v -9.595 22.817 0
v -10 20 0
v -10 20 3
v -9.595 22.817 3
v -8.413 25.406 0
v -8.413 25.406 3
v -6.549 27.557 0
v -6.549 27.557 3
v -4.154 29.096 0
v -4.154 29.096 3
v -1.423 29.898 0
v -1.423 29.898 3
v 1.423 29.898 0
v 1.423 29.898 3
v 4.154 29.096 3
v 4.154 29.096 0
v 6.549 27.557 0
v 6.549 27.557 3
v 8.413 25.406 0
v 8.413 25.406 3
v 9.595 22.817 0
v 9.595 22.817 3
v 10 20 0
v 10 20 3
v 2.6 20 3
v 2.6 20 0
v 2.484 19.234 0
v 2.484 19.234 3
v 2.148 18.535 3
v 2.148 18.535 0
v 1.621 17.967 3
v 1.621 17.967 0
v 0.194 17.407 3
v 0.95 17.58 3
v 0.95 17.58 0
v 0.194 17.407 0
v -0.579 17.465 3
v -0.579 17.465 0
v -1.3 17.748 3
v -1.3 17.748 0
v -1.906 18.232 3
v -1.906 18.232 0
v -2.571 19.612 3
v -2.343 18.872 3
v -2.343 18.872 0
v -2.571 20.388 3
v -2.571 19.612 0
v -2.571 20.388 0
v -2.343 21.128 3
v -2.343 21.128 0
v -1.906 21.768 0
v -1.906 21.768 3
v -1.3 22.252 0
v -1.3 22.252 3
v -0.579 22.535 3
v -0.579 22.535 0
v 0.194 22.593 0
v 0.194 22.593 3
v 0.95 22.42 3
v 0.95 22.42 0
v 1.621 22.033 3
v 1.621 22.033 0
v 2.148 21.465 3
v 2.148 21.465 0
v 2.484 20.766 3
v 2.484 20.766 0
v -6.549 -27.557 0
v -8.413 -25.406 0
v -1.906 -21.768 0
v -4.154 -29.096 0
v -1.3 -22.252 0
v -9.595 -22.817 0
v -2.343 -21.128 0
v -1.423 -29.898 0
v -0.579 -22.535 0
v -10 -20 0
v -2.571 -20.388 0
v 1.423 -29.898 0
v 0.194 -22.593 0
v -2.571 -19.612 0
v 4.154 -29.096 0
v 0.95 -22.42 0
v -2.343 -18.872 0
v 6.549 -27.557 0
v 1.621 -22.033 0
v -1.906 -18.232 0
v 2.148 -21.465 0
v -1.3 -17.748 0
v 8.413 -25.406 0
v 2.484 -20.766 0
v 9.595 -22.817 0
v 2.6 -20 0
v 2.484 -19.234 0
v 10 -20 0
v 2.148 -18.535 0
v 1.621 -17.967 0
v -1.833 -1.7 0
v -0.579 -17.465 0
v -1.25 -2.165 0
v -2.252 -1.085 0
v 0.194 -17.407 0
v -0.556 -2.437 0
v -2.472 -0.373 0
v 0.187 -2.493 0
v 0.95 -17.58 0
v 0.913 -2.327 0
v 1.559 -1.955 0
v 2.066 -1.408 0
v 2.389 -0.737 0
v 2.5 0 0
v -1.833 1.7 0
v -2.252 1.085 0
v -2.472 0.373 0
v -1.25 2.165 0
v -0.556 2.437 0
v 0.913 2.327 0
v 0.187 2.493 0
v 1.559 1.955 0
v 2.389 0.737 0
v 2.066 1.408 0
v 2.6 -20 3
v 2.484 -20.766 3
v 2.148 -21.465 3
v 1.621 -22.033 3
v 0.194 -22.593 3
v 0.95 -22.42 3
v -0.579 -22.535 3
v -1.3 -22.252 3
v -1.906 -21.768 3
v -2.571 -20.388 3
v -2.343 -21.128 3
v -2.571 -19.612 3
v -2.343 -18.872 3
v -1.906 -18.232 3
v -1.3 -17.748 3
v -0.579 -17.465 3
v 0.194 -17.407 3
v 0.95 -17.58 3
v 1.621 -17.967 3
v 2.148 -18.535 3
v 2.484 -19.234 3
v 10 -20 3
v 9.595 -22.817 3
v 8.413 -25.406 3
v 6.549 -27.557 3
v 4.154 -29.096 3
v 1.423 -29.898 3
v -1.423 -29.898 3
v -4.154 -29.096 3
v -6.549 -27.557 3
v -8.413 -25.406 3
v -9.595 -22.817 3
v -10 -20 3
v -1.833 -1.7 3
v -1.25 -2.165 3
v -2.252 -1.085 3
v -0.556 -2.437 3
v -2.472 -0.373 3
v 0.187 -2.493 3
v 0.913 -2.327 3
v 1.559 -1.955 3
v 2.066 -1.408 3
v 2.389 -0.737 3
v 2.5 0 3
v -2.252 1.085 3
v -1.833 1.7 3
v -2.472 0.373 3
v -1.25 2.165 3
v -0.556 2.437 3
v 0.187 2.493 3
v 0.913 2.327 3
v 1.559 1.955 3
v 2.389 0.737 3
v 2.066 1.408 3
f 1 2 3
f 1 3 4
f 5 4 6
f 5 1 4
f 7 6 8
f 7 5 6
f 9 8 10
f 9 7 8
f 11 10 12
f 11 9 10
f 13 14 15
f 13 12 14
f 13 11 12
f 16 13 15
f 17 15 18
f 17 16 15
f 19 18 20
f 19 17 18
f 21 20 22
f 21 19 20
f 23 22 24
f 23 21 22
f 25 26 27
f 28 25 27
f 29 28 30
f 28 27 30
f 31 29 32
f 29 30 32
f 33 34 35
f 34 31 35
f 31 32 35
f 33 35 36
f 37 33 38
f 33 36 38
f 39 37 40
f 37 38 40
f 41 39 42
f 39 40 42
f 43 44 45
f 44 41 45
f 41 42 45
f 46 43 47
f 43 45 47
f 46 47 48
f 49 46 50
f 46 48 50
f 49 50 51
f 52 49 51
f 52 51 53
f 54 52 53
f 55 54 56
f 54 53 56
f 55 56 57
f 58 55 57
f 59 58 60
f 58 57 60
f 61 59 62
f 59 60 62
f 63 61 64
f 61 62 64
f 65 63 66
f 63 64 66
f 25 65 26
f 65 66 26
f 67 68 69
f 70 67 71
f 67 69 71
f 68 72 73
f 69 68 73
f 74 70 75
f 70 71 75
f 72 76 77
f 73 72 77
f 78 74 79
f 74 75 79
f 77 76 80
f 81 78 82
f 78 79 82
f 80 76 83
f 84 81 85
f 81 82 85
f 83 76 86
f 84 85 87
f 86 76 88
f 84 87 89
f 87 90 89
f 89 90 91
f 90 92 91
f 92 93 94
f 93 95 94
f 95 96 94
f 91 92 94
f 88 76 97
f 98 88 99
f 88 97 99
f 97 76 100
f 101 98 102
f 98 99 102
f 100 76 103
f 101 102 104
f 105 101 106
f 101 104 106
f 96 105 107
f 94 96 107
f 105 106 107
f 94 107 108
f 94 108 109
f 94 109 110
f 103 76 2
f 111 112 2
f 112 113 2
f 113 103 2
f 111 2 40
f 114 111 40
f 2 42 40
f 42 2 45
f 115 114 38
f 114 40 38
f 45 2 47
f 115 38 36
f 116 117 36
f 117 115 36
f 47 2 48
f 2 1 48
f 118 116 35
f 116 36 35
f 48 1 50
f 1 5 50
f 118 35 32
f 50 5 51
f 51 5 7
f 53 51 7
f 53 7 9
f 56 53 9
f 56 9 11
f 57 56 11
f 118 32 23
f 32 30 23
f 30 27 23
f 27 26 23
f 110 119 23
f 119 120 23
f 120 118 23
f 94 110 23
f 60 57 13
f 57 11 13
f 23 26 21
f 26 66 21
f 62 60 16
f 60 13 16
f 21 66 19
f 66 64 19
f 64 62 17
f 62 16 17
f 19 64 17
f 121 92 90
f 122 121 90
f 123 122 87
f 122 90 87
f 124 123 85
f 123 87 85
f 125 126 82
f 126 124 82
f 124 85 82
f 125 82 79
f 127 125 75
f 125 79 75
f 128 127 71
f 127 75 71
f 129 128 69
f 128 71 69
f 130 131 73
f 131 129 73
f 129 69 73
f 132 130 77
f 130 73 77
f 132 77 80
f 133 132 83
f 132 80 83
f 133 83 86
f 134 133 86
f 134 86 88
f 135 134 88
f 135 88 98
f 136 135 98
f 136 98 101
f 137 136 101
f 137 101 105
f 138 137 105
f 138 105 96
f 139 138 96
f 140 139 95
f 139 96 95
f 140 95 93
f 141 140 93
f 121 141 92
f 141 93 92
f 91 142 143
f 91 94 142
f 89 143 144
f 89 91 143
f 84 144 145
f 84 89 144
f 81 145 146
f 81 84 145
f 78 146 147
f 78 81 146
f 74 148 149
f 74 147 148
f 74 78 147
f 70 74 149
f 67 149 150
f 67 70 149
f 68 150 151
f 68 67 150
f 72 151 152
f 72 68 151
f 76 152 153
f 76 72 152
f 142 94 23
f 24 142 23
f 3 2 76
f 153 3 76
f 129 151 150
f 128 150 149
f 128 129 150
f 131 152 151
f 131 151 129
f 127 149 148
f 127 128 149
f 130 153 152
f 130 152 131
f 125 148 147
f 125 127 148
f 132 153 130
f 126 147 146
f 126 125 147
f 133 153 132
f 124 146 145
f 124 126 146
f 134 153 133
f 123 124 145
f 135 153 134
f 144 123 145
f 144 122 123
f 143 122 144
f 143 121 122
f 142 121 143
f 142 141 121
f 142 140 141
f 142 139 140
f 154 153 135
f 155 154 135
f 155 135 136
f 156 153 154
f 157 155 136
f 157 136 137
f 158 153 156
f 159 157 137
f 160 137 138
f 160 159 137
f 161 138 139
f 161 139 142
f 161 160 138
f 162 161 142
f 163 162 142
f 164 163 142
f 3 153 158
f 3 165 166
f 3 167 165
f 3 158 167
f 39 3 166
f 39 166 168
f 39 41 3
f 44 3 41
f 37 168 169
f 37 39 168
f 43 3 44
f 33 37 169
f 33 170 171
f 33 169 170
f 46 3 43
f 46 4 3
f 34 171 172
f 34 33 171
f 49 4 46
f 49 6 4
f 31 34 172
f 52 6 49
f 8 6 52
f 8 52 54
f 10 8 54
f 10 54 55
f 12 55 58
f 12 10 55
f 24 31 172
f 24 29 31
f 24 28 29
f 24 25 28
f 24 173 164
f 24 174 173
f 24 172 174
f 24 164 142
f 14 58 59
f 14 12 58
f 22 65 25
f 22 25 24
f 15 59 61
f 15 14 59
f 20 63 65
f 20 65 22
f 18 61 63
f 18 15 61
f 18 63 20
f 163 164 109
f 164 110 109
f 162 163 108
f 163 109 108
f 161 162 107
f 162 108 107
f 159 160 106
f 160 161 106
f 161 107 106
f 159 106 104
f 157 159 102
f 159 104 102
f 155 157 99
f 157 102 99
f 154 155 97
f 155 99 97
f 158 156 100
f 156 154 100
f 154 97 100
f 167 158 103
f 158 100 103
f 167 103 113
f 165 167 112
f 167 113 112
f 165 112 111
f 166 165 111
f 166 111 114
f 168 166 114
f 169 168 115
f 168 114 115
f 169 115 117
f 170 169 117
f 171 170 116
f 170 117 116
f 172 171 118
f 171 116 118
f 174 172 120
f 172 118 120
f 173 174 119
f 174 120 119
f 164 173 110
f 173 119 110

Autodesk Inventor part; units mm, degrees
ref_plane "YZ Plane" through (0, 0, 0) normal (1, 0, 0) x (0, 1, 0)
ref_plane "XZ Plane" through (0, 0, 0) normal (0, 1, 0) x (-1, 0, 0)
ref_plane "XY Plane" through (0, 0, 0) normal (0, 0, 1) x (1, 0, 0)
sketch "Sketch1" plane through (0, 0, 0) normal (0, 0, 1) x (1, 0, 0)
  line L0 (0, 0) -> (0, 20) construction
  line L1 (0, 0) -> (0, 20) construction
  line L2 (0, 20) -> (0, -20) construction
  line L3 (-10, 20) -> (-10, -20)
  line L4 (10, -20) -> (10, 20)
  arc A0 (10, 20) -> (-10, 20) centre (0, 20) ccw
  arc A1 (-10, -20) -> (10, -20) centre (0, -20) ccw
  circle A2 centre (0, 20) radius 2.6
  line L5 (0, 0) -> (10, 0) construction
  circle A3 centre (0, -20) radius 2.6
  circle A4 centre (0, 0) radius 2.5
  dimension "d15" = 20
  dimension "d16" = 20
  dimension "d17" = 40
  dimension "d18" = 10
  dimension "d19" = 5.2
  dimension "d20" = 5
extrude "Extrusion1" add sketch "Sketch1" along normal blind 3
properties part number "FingerSupport"
